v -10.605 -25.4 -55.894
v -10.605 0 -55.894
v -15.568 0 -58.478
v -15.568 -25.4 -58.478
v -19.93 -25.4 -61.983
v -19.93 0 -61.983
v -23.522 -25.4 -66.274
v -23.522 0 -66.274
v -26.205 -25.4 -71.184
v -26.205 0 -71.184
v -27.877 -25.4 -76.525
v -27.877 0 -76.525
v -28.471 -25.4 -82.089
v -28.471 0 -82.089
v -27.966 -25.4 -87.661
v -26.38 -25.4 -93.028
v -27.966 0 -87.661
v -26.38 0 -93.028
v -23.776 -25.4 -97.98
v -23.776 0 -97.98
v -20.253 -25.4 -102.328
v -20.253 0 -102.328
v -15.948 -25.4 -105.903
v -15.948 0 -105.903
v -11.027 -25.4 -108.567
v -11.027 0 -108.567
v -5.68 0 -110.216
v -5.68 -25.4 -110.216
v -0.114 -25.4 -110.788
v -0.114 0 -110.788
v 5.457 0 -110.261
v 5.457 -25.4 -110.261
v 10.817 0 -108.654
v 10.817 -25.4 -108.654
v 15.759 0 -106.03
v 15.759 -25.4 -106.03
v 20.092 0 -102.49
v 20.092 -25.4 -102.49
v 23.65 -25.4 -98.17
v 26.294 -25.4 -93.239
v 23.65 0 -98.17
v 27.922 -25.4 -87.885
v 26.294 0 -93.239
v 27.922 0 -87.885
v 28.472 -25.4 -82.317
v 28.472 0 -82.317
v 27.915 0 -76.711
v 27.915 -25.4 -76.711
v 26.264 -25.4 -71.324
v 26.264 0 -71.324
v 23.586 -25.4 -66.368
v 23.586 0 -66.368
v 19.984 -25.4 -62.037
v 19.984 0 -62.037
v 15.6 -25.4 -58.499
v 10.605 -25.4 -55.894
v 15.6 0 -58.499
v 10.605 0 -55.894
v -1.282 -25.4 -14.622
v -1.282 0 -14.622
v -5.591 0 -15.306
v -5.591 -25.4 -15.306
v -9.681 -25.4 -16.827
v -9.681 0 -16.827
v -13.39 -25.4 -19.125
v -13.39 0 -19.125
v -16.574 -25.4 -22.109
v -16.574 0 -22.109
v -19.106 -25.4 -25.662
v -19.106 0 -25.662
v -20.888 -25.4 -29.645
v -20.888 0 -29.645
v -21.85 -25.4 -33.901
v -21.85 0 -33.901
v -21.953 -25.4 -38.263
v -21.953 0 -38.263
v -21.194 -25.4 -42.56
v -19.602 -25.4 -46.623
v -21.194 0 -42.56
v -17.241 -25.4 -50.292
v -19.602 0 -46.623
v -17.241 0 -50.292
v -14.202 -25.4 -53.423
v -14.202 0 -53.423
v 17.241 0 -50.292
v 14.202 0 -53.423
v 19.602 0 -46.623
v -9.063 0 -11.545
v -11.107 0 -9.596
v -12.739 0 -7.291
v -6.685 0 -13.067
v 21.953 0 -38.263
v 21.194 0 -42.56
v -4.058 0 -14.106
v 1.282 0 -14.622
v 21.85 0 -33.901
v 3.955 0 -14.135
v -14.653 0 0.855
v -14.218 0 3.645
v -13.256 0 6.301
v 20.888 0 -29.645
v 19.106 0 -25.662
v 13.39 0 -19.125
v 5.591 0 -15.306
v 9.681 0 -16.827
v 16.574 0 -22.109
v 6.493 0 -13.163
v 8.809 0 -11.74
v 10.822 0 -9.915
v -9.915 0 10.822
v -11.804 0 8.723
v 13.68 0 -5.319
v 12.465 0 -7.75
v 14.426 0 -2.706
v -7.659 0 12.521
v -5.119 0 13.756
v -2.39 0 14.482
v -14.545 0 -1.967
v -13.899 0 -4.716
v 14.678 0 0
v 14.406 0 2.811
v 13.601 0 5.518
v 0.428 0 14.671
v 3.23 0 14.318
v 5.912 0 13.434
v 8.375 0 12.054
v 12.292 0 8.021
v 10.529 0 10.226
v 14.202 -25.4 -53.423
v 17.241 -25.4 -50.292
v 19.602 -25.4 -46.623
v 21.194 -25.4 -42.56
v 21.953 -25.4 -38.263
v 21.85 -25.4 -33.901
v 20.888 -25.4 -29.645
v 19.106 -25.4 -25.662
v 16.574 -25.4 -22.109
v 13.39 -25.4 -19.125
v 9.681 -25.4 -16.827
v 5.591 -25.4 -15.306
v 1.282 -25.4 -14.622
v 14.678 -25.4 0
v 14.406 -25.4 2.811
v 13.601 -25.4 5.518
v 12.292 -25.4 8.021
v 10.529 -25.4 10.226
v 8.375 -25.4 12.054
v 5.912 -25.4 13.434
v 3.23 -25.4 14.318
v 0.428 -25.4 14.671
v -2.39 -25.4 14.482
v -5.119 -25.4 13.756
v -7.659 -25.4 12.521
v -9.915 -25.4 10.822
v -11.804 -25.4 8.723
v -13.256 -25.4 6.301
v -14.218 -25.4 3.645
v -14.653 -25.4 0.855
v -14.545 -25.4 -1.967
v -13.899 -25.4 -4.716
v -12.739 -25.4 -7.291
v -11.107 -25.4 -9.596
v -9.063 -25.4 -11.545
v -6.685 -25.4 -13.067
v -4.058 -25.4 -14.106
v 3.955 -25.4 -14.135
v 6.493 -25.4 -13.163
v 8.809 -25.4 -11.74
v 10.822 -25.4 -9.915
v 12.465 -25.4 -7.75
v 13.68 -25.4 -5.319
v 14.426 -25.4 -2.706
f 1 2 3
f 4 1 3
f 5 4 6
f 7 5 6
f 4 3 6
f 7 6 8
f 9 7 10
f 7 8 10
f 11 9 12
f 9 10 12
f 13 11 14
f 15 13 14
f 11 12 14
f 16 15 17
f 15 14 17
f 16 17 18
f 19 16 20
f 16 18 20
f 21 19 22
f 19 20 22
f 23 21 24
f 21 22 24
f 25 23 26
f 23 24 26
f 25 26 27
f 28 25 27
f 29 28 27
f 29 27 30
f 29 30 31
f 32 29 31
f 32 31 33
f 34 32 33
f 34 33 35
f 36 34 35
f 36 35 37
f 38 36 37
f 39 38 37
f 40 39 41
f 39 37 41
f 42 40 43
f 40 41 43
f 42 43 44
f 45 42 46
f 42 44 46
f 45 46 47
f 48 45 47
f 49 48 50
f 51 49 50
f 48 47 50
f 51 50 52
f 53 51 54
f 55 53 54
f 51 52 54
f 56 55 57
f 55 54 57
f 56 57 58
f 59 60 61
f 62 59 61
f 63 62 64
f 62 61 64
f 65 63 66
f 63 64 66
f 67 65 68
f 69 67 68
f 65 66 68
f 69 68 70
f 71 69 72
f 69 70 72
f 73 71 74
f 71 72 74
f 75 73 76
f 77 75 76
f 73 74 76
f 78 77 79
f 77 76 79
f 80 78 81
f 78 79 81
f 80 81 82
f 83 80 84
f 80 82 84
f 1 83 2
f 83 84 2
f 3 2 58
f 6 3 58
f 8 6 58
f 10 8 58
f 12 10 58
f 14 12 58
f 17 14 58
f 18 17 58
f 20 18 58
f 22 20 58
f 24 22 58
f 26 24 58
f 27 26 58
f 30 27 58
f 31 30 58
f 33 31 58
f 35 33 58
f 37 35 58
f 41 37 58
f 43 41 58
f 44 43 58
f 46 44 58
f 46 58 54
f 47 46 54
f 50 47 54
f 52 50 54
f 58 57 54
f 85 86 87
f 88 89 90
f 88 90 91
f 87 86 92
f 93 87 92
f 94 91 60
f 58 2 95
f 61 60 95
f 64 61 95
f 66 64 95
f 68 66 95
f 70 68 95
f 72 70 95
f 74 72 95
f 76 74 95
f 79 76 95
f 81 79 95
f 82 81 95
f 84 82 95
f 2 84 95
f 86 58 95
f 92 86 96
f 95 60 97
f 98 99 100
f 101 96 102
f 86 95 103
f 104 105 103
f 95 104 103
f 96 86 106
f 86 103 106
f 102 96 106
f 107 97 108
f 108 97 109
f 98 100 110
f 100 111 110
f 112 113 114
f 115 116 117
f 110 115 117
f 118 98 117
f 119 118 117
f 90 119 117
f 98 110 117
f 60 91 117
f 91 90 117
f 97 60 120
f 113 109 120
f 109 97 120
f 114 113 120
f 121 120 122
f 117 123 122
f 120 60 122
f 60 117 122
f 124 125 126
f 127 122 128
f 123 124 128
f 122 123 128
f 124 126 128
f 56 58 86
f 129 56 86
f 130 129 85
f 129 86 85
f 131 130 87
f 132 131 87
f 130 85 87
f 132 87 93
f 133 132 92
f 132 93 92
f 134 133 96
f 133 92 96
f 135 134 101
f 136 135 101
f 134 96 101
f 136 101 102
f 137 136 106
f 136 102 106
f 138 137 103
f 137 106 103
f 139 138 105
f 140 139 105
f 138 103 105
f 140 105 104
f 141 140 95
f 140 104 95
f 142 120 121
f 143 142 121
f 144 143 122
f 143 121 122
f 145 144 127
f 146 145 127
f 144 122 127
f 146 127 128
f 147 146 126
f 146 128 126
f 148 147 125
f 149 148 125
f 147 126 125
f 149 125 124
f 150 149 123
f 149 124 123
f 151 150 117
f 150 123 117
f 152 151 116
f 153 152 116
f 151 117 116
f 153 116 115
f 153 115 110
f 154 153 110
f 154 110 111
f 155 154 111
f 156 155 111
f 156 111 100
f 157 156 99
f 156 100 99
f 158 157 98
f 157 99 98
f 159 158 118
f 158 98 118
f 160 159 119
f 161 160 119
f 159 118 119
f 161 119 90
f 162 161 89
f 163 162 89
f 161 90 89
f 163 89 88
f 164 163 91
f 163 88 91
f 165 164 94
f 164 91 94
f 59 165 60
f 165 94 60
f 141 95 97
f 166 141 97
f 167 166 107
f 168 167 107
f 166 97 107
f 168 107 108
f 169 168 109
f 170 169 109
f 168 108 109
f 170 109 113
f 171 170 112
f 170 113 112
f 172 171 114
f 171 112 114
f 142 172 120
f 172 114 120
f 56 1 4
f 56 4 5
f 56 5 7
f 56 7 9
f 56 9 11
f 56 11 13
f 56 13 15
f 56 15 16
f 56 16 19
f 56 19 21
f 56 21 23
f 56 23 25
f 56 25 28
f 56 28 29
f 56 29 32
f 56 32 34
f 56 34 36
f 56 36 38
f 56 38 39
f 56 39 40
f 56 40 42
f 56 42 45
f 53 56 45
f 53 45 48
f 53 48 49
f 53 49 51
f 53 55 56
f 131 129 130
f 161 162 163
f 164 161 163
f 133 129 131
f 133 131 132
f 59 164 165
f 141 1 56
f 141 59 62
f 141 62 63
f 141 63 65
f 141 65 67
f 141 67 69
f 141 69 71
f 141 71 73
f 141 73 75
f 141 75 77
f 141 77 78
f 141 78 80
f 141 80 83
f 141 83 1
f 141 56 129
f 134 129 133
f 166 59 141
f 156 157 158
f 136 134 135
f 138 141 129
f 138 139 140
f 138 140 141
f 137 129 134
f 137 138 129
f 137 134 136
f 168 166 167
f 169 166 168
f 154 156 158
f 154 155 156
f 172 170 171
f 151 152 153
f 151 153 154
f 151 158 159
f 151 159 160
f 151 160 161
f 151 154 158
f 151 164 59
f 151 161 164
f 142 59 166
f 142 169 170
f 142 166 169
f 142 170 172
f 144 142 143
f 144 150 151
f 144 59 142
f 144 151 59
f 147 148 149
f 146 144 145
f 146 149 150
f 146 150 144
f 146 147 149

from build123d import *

# Parameters (mm, degrees)
F1_DEPTH = 25.4


with BuildPart() as f1:
    # F0 (on Front) → F1 (new body)
    with BuildSketch(Plane.XZ):
        with BuildLine():
            ThreePointArc((1.281621129, -14.6216553688), (10.8223525607, -9.9152429872), (14.6777163906, 0))
            ThreePointArc((14.6777163906, 0), (-9.9152429872, 10.8223525607), (-1.281621129, -14.6216553688))
            ThreePointArc((-1.281621129, -14.6216553688), (0, -14.5843201005), (1.281621129, -14.6216553688))
        make_face()
        with BuildLine():
            ThreePointArc((1.281621129, -14.6216553688), (0, -14.5843201005), (-1.281621129, -14.6216553688))
            ThreePointArc((-1.281621129, -14.6216553688), (0, -14.6777163906), (1.281621129, -14.6216553688))
        make_face()
        with BuildLine():
            ThreePointArc((1.281621129, -14.6216553688), (0, -14.6777163906), (-1.281621129, -14.6216553688))
            ThreePointArc((-1.281621129, -14.6216553688), (-21.4748376357, -31.7489642451), (-10.6053259906, -55.8936203584))
            ThreePointArc((-10.6053259906, -55.8936203584), (0, -53.8447494391), (10.6053259906, -55.8936203584))
            ThreePointArc((10.6053259906, -55.8936203584), (18.9498178248, -47.8078512952), (22.0160014308, -36.6003215313))
            ThreePointArc((22.0160014308, -36.6003215313), (16.0143762228, -21.4925727515), (1.281621129, -14.6216553688))
        make_face()
        with BuildLine():
            ThreePointArc((10.6053259906, -55.8936203584), (0, -53.8447494391), (-10.6053259906, -55.8936203584))
            ThreePointArc((-10.6053259906, -55.8936203584), (0, -58.6163229621), (10.6053259906, -55.8936203584))
        make_face()
        with BuildLine():
            ThreePointArc((10.6053259906, -55.8936203584), (0, -58.6163229621), (-10.6053259906, -55.8936203584))
            ThreePointArc((-10.6053259906, -55.8936203584), (-15.9483365423, -105.9028248142), (28.4719770071, -82.3167264462))
            ThreePointArc((28.4719770071, -82.3167264462), (23.586098368, -66.3683899038), (10.6053259906, -55.8936203584))
        make_face()
    extrude(amount=F1_DEPTH)


solid = f1.part
